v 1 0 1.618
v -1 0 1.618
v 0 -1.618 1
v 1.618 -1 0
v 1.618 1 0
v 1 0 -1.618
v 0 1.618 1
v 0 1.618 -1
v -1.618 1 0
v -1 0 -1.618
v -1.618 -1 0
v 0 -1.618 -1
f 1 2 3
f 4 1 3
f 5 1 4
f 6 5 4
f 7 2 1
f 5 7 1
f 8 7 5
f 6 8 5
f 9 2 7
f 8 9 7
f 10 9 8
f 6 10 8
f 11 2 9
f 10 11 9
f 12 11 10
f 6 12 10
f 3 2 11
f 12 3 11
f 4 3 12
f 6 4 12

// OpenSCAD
a=ico(1);
polyhedron(a[0],a[1]);
function ico(size=1)=
let(a=size,r=size*(1+sqrt(5))/2)[[[0,-r,a],[0,r,a],[0,r,-a],[0,-r,-a],[a,0,r],[-a,0,r],[-a,0,-r],[a,0,-r],[r,a,0],[-r,a,0],[-r,-a,0],[r,-a,0]],[[0,5,4],[0,4,11],[11,4,8],[11,8,7],[4,5,1],[4,1,8],[8,1,2],[8,2,7],[1,5,9],[1,9,2],[2,9,6],[2,6,7],[9,5,10],[9,10,6],[6,10,3],[6,3,7],[10,5,0],[10,0,3],[3,0,11],[3,11,7]]];
